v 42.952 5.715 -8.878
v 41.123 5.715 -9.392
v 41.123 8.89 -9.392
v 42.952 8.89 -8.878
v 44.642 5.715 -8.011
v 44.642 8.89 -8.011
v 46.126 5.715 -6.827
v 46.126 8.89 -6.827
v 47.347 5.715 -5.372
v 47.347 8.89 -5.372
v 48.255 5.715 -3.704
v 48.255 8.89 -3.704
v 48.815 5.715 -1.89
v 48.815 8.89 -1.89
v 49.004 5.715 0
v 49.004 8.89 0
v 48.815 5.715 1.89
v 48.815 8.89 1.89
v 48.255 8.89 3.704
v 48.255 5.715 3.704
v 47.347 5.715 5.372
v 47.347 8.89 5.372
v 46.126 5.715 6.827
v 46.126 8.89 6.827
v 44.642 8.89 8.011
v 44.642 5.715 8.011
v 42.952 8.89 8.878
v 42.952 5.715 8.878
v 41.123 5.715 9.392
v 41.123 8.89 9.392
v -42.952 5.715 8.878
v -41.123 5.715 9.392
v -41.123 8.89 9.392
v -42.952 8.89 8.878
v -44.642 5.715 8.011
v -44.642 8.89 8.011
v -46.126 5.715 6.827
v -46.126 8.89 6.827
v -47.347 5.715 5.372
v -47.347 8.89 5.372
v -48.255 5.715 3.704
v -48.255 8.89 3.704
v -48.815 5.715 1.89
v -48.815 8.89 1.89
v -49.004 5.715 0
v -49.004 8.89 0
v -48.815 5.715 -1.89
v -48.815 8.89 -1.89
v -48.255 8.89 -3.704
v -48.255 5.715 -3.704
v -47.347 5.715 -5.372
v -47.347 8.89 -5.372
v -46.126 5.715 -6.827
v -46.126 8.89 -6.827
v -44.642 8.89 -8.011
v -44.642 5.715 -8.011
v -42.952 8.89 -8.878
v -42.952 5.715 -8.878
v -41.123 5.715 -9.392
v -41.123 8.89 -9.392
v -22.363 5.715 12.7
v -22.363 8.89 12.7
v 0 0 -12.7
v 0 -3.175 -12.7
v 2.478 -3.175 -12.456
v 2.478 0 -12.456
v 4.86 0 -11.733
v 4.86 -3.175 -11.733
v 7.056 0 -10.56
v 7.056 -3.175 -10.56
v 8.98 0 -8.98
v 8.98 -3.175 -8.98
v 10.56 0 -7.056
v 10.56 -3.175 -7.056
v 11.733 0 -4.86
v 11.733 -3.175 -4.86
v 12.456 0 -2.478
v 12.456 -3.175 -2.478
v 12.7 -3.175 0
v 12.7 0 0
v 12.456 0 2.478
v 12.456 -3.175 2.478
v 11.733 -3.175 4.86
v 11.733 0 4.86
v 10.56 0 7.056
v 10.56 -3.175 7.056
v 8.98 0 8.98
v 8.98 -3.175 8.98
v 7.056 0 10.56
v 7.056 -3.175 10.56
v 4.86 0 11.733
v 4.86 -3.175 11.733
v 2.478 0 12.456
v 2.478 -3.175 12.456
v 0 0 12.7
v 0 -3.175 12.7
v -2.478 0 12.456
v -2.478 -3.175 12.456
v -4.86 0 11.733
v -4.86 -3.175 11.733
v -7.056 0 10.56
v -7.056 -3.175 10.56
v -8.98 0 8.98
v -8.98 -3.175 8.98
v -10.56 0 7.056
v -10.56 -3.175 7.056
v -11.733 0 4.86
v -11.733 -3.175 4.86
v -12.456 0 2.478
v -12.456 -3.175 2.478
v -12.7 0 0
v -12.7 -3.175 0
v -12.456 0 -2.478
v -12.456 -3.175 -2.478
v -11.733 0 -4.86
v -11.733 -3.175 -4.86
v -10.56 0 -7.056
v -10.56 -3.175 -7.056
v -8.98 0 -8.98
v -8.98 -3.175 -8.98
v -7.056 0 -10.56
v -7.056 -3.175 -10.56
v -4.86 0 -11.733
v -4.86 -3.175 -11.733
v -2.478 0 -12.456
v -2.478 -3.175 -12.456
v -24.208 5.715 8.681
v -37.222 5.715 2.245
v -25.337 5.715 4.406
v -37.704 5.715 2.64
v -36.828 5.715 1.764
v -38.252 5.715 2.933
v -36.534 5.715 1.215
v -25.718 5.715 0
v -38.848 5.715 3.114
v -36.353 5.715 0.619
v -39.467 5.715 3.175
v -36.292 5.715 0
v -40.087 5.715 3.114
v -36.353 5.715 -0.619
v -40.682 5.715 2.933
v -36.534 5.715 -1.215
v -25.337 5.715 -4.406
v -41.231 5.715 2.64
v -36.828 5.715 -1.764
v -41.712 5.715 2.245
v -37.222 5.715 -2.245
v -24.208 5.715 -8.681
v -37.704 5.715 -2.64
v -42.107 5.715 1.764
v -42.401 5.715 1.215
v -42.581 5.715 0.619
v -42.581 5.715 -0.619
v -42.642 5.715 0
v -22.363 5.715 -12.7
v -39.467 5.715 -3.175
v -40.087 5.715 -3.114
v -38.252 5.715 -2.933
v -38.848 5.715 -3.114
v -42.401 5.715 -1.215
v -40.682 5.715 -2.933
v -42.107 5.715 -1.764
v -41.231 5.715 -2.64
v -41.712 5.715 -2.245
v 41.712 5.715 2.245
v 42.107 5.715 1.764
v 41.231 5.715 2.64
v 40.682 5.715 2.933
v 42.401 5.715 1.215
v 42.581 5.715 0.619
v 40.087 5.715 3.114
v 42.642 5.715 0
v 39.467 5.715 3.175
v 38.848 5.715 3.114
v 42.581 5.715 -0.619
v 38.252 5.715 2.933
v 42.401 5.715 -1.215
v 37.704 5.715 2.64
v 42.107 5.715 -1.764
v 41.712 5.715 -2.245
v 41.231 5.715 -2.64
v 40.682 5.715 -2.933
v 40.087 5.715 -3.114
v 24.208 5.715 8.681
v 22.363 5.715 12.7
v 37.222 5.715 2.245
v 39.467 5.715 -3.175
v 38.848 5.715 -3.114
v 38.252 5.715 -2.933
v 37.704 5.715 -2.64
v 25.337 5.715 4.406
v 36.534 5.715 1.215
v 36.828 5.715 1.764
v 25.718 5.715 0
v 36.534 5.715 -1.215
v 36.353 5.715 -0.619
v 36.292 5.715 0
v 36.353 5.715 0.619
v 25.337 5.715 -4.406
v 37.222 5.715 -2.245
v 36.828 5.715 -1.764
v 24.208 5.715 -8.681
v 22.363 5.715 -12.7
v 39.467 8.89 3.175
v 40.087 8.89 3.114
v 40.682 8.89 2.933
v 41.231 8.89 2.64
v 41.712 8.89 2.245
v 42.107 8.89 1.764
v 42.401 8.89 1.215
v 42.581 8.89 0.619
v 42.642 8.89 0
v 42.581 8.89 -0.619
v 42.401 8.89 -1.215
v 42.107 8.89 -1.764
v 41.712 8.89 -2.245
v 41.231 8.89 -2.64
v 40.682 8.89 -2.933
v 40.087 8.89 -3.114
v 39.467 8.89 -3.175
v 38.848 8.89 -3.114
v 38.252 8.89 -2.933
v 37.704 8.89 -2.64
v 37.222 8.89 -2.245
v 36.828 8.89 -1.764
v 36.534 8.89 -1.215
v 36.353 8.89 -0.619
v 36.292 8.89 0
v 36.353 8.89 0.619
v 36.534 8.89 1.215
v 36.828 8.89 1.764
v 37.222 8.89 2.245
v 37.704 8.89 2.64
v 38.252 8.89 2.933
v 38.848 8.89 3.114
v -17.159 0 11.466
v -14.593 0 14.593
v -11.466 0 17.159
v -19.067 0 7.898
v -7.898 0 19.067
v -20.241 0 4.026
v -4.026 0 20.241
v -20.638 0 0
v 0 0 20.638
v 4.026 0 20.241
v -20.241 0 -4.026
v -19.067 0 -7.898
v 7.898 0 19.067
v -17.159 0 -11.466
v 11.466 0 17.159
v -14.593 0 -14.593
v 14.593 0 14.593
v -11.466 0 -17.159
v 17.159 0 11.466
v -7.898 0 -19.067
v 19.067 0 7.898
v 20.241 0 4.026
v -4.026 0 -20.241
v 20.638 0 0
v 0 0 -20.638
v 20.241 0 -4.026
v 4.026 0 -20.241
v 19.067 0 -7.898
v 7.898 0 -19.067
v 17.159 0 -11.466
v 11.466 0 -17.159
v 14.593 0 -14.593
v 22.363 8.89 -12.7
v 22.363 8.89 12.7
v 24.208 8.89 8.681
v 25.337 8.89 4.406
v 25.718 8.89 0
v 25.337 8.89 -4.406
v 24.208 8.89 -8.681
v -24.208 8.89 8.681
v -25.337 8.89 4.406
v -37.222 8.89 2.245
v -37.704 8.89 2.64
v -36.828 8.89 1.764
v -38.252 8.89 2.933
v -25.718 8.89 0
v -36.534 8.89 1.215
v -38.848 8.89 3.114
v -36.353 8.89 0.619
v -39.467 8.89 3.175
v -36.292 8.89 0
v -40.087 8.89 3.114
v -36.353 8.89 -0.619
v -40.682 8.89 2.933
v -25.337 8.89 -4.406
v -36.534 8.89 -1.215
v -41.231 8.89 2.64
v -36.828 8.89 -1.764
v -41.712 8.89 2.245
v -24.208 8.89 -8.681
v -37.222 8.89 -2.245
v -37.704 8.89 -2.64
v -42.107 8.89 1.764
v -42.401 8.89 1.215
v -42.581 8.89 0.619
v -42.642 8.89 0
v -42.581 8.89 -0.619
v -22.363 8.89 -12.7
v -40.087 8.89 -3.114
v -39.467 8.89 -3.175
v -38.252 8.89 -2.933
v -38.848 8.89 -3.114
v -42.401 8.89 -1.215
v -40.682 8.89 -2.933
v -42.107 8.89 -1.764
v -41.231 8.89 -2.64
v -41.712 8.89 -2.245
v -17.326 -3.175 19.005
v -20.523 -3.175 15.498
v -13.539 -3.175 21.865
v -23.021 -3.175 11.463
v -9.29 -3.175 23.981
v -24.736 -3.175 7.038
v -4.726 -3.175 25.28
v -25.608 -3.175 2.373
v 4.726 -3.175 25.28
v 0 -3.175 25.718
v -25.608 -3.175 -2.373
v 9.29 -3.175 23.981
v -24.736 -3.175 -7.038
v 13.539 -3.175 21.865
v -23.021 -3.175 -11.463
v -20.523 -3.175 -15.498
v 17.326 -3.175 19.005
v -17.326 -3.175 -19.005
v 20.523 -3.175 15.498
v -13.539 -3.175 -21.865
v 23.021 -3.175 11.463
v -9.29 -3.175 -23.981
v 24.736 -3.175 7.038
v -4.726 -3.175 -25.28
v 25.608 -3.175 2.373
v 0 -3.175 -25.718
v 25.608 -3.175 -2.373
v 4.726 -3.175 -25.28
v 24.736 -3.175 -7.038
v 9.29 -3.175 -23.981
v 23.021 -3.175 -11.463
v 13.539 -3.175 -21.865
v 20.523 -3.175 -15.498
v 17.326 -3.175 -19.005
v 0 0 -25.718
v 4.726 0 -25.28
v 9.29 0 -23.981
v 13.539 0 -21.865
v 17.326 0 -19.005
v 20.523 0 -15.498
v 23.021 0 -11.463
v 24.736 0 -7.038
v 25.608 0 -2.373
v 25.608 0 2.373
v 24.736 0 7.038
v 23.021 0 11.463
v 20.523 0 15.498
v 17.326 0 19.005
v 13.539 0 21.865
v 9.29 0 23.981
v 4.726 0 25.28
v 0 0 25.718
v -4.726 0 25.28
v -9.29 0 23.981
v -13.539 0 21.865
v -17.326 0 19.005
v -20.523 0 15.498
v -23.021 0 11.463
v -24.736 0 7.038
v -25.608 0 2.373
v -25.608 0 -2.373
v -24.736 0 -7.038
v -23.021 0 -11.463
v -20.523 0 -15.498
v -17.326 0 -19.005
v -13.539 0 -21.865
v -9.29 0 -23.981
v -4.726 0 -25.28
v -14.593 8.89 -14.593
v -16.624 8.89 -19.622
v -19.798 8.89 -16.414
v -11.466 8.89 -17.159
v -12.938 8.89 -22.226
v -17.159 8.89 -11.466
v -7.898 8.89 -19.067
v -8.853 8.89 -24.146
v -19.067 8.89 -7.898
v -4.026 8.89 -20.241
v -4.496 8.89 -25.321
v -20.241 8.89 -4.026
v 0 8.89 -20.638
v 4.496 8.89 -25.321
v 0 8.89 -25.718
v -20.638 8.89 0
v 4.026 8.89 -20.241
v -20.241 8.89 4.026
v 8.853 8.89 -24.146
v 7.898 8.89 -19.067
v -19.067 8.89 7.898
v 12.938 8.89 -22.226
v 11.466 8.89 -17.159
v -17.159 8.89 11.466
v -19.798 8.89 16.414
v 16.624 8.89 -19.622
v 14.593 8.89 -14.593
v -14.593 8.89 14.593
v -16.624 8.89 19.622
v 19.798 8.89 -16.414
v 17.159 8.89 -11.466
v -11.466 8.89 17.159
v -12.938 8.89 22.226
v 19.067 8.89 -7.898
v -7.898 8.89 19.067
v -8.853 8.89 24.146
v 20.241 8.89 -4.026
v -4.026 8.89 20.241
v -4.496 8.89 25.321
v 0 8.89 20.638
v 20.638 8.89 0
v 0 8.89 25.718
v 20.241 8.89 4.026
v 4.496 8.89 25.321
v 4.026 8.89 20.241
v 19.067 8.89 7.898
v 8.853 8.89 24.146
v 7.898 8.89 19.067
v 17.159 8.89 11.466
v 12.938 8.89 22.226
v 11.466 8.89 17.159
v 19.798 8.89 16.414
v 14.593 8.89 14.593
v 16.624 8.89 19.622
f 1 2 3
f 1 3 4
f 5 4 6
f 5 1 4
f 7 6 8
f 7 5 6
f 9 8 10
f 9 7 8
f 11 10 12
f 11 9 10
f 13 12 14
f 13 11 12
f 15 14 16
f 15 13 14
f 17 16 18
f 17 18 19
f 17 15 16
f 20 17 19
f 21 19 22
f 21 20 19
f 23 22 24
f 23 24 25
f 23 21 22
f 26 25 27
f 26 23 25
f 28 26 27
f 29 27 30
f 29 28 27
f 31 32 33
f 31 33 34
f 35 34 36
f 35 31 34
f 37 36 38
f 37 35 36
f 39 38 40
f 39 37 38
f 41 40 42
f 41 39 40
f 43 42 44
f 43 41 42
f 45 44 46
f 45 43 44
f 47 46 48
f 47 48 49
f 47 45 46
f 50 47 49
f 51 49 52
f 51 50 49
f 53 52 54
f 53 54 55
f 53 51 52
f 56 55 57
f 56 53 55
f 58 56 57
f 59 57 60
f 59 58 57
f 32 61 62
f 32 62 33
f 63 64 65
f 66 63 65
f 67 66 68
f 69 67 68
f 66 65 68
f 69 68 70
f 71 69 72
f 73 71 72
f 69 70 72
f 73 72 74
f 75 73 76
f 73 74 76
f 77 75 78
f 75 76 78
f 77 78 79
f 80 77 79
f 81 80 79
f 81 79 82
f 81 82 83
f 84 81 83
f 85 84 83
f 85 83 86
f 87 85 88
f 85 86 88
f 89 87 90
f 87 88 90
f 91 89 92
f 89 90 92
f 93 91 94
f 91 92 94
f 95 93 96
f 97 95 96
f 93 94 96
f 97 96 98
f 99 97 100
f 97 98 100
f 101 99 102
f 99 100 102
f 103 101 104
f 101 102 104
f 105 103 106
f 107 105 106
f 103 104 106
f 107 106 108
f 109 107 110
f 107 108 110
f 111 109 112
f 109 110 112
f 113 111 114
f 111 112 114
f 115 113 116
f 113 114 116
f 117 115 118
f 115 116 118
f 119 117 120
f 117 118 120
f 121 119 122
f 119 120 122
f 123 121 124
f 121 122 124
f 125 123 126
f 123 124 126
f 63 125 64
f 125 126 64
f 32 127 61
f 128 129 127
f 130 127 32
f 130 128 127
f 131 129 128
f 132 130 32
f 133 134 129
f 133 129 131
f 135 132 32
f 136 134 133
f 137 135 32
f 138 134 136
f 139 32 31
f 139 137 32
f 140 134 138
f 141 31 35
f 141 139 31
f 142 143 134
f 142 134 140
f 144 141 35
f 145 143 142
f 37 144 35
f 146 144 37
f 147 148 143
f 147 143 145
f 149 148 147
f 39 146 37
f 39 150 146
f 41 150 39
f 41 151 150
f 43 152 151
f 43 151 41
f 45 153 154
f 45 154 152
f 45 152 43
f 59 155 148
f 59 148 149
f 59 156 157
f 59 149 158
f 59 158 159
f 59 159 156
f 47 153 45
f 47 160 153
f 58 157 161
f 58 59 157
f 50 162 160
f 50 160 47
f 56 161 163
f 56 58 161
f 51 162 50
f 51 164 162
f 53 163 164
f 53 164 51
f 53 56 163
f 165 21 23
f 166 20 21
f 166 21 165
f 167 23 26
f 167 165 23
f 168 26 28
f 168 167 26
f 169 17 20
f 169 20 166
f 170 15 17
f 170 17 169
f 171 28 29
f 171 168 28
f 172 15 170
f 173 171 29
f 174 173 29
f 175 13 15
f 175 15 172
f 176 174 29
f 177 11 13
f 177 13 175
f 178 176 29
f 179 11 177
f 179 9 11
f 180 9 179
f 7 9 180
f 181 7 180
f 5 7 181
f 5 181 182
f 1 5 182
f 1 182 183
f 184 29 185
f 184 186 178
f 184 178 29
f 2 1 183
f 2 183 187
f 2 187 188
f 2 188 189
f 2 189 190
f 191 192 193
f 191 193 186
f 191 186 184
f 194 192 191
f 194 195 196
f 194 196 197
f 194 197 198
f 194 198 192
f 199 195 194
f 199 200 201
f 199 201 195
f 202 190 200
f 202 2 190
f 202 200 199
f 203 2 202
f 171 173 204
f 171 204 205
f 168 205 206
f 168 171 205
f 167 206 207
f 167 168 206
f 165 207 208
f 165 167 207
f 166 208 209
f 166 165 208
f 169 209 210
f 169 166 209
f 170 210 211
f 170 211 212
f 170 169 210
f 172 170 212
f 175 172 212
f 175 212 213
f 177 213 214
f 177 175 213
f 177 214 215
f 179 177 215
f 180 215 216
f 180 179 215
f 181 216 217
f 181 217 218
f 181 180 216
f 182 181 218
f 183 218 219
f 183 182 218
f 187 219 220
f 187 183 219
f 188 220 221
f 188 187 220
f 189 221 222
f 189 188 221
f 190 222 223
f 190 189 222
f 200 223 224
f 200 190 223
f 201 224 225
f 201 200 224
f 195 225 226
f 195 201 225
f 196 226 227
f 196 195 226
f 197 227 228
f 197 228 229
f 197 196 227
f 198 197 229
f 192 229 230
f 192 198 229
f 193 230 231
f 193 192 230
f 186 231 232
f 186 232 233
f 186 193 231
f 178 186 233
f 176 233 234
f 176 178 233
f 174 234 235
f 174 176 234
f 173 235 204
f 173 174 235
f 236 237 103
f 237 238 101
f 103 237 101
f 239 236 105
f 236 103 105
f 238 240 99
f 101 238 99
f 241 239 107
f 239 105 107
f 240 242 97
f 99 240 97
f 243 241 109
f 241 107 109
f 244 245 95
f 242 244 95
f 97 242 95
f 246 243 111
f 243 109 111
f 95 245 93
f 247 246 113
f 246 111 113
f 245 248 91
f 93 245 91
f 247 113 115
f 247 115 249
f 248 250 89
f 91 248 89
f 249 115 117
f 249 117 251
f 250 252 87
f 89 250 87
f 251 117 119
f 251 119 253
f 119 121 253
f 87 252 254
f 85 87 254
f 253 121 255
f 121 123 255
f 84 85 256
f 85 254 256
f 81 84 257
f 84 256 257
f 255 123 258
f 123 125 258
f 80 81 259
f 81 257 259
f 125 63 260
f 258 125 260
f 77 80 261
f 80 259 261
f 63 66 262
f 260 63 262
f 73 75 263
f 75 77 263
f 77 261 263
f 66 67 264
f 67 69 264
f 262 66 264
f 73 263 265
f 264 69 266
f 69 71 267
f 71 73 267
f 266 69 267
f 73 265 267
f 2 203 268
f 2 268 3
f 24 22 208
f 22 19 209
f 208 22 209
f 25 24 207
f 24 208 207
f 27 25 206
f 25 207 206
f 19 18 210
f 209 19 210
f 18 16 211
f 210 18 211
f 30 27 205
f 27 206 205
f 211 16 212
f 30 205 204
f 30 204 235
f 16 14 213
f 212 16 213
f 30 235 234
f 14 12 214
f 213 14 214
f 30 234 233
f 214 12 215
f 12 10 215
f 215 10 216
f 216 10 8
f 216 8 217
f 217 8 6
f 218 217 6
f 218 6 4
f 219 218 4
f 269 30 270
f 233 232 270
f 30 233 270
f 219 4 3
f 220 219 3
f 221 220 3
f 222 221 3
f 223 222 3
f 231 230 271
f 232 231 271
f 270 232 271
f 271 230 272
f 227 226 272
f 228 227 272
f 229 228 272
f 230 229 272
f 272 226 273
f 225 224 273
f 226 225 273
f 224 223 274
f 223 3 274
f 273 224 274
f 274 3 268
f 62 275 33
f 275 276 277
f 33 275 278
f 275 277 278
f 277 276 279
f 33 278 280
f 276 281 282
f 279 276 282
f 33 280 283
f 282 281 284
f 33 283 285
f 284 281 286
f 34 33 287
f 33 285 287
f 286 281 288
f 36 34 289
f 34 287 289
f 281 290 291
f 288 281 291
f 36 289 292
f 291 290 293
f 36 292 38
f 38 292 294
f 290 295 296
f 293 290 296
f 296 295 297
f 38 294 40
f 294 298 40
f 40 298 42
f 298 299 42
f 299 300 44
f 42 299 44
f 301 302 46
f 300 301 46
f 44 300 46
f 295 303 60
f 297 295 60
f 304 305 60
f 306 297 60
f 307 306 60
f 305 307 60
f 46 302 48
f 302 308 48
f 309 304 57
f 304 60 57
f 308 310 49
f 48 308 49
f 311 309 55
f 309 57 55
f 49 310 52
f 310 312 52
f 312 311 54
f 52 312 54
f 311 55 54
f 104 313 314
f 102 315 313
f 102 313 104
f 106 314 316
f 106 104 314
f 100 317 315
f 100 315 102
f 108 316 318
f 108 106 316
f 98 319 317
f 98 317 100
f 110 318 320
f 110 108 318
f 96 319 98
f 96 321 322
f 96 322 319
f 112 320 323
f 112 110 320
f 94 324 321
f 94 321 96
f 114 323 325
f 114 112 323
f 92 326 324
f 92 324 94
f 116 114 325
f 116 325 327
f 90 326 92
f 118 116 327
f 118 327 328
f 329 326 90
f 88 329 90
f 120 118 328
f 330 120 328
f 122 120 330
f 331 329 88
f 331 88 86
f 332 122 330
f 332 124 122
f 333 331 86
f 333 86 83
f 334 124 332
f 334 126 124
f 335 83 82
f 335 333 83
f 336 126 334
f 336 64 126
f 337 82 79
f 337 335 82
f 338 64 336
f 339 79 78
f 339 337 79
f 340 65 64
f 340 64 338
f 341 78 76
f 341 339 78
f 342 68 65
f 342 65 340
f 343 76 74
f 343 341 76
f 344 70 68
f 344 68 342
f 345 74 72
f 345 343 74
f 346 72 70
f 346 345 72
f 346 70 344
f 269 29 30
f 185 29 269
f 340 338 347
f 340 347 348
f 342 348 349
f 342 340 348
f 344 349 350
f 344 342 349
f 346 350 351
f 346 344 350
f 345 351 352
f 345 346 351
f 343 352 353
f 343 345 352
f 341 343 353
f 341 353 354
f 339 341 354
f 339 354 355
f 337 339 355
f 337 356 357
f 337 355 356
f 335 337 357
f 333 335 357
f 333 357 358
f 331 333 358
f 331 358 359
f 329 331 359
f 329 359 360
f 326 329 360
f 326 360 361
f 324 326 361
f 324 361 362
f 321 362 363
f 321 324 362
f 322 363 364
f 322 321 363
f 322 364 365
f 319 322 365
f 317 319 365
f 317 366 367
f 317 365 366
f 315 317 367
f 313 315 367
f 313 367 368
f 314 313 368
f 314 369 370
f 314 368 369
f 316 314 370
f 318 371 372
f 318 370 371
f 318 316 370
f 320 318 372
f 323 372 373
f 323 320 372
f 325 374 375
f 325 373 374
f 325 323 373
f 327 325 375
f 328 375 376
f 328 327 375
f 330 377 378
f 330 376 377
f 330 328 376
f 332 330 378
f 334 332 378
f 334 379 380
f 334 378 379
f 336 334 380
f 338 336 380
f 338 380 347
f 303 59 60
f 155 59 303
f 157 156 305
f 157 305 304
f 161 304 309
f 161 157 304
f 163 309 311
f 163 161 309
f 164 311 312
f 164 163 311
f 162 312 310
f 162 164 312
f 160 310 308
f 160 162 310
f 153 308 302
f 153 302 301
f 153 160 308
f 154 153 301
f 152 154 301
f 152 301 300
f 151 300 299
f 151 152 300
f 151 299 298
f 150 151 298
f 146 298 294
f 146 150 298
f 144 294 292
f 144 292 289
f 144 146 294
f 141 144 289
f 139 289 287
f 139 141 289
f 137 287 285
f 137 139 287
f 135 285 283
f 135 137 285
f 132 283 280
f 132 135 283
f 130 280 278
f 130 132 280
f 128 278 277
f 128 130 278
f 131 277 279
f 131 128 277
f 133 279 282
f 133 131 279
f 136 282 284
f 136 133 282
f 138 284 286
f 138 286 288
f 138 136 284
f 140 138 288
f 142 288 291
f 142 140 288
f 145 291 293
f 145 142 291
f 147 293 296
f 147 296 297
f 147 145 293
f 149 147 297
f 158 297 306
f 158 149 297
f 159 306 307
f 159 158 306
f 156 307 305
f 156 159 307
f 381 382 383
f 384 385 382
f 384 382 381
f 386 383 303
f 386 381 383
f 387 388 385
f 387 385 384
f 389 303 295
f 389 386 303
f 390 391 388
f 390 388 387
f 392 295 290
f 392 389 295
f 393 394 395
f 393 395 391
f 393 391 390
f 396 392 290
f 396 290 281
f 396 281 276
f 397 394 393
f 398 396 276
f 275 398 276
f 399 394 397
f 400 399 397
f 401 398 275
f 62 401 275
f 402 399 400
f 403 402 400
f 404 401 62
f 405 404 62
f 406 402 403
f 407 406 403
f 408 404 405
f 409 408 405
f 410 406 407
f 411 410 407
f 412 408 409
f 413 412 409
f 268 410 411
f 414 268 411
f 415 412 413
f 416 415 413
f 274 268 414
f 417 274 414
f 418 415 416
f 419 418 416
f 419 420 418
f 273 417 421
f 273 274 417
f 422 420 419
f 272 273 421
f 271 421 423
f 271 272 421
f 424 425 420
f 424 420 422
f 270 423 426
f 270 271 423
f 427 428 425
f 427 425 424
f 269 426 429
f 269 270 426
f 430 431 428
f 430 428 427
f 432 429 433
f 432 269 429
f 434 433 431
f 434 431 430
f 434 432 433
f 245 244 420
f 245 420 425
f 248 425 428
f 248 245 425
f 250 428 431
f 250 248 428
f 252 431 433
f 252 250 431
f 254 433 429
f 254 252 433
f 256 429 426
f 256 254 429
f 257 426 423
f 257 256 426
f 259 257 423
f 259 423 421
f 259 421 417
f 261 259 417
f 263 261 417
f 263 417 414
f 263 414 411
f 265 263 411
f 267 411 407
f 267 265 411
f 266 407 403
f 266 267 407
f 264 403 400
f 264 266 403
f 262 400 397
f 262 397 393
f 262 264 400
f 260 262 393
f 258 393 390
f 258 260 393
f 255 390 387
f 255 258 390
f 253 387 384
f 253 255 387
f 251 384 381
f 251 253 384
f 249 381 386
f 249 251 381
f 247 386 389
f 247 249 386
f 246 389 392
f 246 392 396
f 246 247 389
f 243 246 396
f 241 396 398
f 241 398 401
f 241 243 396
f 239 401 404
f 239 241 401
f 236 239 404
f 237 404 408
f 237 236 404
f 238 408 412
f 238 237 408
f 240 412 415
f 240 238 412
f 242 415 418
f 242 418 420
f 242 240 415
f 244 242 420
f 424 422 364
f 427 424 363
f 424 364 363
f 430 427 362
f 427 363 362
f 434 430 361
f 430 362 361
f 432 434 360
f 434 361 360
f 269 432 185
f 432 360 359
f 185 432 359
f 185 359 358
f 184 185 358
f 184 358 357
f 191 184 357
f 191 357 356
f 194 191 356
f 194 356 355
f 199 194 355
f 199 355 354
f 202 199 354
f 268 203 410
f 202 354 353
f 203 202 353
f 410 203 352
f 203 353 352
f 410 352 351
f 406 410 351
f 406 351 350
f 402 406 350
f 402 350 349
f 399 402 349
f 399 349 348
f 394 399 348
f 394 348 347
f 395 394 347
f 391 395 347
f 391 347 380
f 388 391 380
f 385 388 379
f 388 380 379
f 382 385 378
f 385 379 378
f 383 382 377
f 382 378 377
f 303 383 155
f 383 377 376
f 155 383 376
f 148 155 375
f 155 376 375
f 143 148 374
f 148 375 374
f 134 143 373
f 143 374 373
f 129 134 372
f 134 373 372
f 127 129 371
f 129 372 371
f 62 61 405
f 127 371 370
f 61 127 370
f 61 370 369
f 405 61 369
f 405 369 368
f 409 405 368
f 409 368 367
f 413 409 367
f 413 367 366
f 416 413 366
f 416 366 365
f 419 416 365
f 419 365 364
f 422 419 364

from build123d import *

# Parameters (mm, degrees)
SKETCH1_R           = 25.7175
SKETCH1_R_2         = 20.6375
BOSS_EXTRUDE1_DEPTH = 8.89
BOSS_EXTRUDE2_START = 3.175
SKETCH2_R           = 25.7175
SKETCH2_R_2         = 12.7
BOSS_EXTRUDE2_DEPTH = 3.175
BOSS_EXTRUDE3_START = -3.175
SKETCH3_R           = 3.175
BOSS_EXTRUDE3_DEPTH = 3.175


with BuildPart() as part:
    # Sketch1 → Boss-Extrude1 (new body)
    with BuildSketch(Plane(origin=(0, 0, 0), x_dir=(1, 0, 0), z_dir=(0, 1, 0))):
        with Locations(Location((0, 0, 0), (0, 0, 270))):
            Circle(SKETCH1_R)
        with Locations(Location((0, 0, 0), (0, 0, 270))):
            Circle(SKETCH1_R_2, mode=Mode.SUBTRACT)
    extrude(amount=BOSS_EXTRUDE1_DEPTH)

    # Sketch2 → Boss-Extrude2 (add)
    with BuildSketch(Plane.XZ.offset(BOSS_EXTRUDE2_START)):
        with Locations(Location((0, 0, 0), (0, 0, 270))):
            Circle(SKETCH2_R)
        with Locations(Location((0, 0, 0), (0, 0, 270))):
            Circle(SKETCH2_R_2, mode=Mode.SUBTRACT)
    extrude(amount=-BOSS_EXTRUDE2_DEPTH)

    # Sketch3 → Boss-Extrude3 (add)
    # profile 1 of 2: a face of its own
    with BuildSketch(Plane(origin=(0, 8.89, 0), x_dir=(1, 0, 0), z_dir=(0, 1, 0)).offset(BOSS_EXTRUDE3_START)):
        with BuildLine():
            Line((22.362911399, 12.7), (41.123499094, 9.392002215))
            ThreePointArc((41.123499094, 9.392002215), (49.004324689, 0), (41.123499094, -9.392002215))
            Line((41.123499094, -9.392002215), (22.362911399, -12.7))
            ThreePointArc((22.362911399, -12.7), (25.7175, 0), (22.362911399, 12.7))
        make_face()
        with Locations(Location((39.467435701, 0, 0), (0, 0, 270))):
            Circle(SKETCH3_R, mode=Mode.SUBTRACT)
    # profile 2 of 2: a face of its own
    with BuildSketch(Plane(origin=(0, 8.89, 0), x_dir=(1, 0, 0), z_dir=(0, 1, 0)).offset(BOSS_EXTRUDE3_START)):
        with BuildLine():
            Line((-22.362911399, -12.7), (-41.123499094, -9.392002215))
            ThreePointArc((-41.123499094, -9.392002215), (-49.004324689, 0), (-41.123499094, 9.392002215))
            Line((-41.123499094, 9.392002215), (-22.362911399, 12.7))
            ThreePointArc((-22.362911399, 12.7), (-25.7175, 0), (-22.362911399, -12.7))
        make_face()
        with Locations(Location((-39.467435701, 0, 0), (0, 0, 90))):
            Circle(SKETCH3_R, mode=Mode.SUBTRACT)
    extrude(amount=BOSS_EXTRUDE3_DEPTH)


solid = part.part
